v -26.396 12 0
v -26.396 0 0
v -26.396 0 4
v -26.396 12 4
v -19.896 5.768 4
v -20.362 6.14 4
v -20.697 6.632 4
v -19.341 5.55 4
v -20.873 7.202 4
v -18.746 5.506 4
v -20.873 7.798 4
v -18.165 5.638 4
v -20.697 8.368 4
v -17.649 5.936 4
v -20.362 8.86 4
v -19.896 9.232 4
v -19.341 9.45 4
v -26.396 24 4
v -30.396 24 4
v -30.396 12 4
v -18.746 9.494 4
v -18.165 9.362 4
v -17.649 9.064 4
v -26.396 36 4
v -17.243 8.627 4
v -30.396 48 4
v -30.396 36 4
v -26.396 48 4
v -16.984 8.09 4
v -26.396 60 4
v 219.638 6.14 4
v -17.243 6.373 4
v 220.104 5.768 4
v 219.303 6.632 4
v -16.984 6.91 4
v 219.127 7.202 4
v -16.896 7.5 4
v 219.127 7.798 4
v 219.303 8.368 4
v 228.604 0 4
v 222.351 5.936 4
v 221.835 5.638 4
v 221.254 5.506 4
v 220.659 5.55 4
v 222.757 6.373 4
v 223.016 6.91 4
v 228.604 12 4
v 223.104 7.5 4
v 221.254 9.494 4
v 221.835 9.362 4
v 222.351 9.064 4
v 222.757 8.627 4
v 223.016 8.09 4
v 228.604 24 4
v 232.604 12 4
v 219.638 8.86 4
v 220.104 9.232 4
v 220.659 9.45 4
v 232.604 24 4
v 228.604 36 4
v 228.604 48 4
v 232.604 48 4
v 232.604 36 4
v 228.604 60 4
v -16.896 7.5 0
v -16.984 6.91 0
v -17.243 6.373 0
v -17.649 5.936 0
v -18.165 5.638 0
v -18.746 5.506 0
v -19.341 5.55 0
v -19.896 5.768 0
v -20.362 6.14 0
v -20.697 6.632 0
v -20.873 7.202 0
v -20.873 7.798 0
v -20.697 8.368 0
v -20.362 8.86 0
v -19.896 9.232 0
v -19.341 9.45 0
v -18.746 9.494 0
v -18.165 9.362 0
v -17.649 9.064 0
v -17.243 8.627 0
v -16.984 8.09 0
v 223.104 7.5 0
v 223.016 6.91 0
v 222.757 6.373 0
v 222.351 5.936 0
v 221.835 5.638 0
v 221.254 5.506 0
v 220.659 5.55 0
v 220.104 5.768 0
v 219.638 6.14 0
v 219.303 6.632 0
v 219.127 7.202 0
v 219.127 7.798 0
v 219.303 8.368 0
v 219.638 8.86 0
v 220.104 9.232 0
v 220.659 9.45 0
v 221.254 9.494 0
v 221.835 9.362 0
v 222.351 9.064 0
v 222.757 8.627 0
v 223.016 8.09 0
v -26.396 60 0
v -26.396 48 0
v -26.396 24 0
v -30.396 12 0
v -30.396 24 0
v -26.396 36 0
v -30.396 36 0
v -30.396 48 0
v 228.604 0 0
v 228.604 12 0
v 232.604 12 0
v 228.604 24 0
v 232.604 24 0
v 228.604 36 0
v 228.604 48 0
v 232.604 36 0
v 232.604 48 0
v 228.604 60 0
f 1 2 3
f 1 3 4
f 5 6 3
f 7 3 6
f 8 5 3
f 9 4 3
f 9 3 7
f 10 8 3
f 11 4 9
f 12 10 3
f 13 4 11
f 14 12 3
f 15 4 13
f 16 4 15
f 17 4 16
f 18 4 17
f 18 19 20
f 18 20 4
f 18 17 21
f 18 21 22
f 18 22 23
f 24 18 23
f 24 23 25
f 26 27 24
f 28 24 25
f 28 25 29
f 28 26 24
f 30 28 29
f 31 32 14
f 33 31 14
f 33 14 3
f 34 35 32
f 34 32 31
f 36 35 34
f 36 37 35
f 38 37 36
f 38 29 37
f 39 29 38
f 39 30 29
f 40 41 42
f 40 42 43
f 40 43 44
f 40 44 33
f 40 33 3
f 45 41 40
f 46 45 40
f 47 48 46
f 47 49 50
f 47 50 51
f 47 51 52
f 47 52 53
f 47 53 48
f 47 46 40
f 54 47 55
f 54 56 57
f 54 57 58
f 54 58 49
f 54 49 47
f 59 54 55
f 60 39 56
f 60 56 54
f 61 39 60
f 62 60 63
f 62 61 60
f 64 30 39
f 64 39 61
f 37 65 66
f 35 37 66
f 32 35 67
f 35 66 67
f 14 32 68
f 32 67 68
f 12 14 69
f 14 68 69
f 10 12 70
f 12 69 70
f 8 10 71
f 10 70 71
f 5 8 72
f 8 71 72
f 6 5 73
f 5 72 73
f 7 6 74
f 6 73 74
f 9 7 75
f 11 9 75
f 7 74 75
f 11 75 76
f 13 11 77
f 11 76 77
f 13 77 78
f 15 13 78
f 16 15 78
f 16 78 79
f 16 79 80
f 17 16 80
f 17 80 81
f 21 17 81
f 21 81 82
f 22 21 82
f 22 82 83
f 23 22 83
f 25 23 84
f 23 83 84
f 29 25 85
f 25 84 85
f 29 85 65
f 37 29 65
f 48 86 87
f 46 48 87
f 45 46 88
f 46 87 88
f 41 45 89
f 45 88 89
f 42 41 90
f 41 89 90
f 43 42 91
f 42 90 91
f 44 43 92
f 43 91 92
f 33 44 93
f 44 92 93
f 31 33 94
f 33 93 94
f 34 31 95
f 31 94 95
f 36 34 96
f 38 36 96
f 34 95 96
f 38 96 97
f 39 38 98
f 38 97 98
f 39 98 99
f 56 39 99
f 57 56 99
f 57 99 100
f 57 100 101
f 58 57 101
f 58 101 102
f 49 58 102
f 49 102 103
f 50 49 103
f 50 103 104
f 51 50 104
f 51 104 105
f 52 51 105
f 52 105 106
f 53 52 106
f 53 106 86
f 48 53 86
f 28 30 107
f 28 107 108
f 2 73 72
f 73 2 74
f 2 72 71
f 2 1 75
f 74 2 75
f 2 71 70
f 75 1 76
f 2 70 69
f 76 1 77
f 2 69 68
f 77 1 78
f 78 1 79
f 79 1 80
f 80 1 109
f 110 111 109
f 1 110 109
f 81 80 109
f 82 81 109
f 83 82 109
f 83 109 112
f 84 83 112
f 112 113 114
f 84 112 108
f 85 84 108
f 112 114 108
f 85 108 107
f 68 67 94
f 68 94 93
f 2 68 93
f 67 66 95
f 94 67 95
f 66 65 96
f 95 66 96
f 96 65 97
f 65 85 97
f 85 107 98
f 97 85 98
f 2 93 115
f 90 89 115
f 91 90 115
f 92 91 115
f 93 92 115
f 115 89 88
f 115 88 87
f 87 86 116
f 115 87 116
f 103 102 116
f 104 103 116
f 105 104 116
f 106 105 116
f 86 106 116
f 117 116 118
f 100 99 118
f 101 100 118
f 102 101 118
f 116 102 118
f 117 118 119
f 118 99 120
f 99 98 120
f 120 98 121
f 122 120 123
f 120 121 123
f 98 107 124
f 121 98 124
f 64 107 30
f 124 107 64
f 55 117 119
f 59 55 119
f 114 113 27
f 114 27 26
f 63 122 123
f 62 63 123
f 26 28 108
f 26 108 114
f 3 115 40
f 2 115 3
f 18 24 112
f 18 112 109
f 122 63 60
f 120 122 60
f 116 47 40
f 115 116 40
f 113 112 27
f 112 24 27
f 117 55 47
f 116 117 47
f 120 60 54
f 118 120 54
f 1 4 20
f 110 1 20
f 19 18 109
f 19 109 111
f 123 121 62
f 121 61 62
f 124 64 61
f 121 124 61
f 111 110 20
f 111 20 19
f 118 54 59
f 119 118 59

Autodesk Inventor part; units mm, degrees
ref_plane "YZ Plane" through (0, 0, 0) normal (1, 0, 0) x (0, 1, 0)
ref_plane "XZ Plane" through (0, 0, 0) normal (0, 1, 0) x (-1, 0, 0)
ref_plane "XY Plane" through (0, 0, 0) normal (0, 0, 1) x (1, 0, 0)
sketch "Эскиз1" plane through (0, 0, 0) normal (0, 0, 1) x (1, 0, 0)
  line L0 (-26.3955, 0) -> (-26.3955, 30) projected
  line L1 (228.6045, 0) -> (228.6045, 60.0004)
  circle A0 centre (221.1045, 7.5) radius 2
  circle A1 centre (-18.8955, 7.5) radius 2 projected
  line L2 (-26.3955, 60.0004) -> (-30.3955, 60.0004) projected
  line L3 (-26.3955, 60.0004) -> (228.6045, 60.0004)
  line L4 (228.6045, 0) -> (-26.3955, 0)
  line L5 (-26.3955, 0) -> (-26.3955, 60.0004)
  point P0 (0, 0)
  dimension "d19" = 7.5
  dimension "d20" = 7.5
  dimension "d21" = 255
extrude "Выдавливание1" add sketch "Эскиз1" along normal blind 4
thicken "Толщина1" operation add thickness 4 both sides no extend neighbours yes toward (1, 0, 0) faces at (228.6045, 20.0001, 2.6667)
thicken "Толщина2" operation add thickness 4 both sides no extend neighbours yes toward (-1, 0, 0) faces at (-26.3955, 40.0003, 2.6667)
sketch "Эскиз2" plane through (0, 0, 4) normal (0, 0, 1) x (1, 0, 0)
  line L0 (232.6045, 60.0004) -> (-30.3955, 60.0004) projected
  line L1 (-30.3955, 60.0004) -> (-26.3955, 60.0004)
  line L2 (-26.3955, 60.0004) -> (-26.3955, 48.0004)
  line L3 (-26.3955, 48.0004) -> (-30.3955, 48.0004)
  line L4 (-30.3955, 48.0004) -> (-30.3955, 60.0004)
  line L5 (232.6045, 60.0004) -> (228.6045, 60.0004)
  line L6 (228.6045, 60.0004) -> (228.6045, 48.0004)
  line L7 (228.6045, 48.0004) -> (232.6045, 48.0004)
  line L8 (232.6045, 48.0004) -> (232.6045, 60.0004)
  point P0 (0, 0)
  point P1 (228.6045, 60.0004)
  dimension "d6" = 4
  dimension "d7" = 12
  dimension "d8" = 4
  dimension "d9" = 12
extrude "Выдавливание2" cut sketch "Эскиз2" against normal blind 4
pattern_linear "Прямоуг.массив1" count 3 spacing 24 along (0, -1, 0) of "Выдавливание2"
thicken "Толщина3" operation add thickness 4 both sides no extend neighbours yes toward (1, 0, 0) faces at (-30.3955, 0.0003, 1.3333) (-29.0622, 0.0004, 2.6667)
thicken "Толщина4" operation add thickness 4 both sides no extend neighbours yes toward (-1, 0, 0) faces at (232.6045, 0.0001, 1.3333) (229.9378, 0.0004, 2.6667)
properties part number "KB33-046-004-014 - Лицевая вертикальня пластина" material "Пластик ПЭТ"
